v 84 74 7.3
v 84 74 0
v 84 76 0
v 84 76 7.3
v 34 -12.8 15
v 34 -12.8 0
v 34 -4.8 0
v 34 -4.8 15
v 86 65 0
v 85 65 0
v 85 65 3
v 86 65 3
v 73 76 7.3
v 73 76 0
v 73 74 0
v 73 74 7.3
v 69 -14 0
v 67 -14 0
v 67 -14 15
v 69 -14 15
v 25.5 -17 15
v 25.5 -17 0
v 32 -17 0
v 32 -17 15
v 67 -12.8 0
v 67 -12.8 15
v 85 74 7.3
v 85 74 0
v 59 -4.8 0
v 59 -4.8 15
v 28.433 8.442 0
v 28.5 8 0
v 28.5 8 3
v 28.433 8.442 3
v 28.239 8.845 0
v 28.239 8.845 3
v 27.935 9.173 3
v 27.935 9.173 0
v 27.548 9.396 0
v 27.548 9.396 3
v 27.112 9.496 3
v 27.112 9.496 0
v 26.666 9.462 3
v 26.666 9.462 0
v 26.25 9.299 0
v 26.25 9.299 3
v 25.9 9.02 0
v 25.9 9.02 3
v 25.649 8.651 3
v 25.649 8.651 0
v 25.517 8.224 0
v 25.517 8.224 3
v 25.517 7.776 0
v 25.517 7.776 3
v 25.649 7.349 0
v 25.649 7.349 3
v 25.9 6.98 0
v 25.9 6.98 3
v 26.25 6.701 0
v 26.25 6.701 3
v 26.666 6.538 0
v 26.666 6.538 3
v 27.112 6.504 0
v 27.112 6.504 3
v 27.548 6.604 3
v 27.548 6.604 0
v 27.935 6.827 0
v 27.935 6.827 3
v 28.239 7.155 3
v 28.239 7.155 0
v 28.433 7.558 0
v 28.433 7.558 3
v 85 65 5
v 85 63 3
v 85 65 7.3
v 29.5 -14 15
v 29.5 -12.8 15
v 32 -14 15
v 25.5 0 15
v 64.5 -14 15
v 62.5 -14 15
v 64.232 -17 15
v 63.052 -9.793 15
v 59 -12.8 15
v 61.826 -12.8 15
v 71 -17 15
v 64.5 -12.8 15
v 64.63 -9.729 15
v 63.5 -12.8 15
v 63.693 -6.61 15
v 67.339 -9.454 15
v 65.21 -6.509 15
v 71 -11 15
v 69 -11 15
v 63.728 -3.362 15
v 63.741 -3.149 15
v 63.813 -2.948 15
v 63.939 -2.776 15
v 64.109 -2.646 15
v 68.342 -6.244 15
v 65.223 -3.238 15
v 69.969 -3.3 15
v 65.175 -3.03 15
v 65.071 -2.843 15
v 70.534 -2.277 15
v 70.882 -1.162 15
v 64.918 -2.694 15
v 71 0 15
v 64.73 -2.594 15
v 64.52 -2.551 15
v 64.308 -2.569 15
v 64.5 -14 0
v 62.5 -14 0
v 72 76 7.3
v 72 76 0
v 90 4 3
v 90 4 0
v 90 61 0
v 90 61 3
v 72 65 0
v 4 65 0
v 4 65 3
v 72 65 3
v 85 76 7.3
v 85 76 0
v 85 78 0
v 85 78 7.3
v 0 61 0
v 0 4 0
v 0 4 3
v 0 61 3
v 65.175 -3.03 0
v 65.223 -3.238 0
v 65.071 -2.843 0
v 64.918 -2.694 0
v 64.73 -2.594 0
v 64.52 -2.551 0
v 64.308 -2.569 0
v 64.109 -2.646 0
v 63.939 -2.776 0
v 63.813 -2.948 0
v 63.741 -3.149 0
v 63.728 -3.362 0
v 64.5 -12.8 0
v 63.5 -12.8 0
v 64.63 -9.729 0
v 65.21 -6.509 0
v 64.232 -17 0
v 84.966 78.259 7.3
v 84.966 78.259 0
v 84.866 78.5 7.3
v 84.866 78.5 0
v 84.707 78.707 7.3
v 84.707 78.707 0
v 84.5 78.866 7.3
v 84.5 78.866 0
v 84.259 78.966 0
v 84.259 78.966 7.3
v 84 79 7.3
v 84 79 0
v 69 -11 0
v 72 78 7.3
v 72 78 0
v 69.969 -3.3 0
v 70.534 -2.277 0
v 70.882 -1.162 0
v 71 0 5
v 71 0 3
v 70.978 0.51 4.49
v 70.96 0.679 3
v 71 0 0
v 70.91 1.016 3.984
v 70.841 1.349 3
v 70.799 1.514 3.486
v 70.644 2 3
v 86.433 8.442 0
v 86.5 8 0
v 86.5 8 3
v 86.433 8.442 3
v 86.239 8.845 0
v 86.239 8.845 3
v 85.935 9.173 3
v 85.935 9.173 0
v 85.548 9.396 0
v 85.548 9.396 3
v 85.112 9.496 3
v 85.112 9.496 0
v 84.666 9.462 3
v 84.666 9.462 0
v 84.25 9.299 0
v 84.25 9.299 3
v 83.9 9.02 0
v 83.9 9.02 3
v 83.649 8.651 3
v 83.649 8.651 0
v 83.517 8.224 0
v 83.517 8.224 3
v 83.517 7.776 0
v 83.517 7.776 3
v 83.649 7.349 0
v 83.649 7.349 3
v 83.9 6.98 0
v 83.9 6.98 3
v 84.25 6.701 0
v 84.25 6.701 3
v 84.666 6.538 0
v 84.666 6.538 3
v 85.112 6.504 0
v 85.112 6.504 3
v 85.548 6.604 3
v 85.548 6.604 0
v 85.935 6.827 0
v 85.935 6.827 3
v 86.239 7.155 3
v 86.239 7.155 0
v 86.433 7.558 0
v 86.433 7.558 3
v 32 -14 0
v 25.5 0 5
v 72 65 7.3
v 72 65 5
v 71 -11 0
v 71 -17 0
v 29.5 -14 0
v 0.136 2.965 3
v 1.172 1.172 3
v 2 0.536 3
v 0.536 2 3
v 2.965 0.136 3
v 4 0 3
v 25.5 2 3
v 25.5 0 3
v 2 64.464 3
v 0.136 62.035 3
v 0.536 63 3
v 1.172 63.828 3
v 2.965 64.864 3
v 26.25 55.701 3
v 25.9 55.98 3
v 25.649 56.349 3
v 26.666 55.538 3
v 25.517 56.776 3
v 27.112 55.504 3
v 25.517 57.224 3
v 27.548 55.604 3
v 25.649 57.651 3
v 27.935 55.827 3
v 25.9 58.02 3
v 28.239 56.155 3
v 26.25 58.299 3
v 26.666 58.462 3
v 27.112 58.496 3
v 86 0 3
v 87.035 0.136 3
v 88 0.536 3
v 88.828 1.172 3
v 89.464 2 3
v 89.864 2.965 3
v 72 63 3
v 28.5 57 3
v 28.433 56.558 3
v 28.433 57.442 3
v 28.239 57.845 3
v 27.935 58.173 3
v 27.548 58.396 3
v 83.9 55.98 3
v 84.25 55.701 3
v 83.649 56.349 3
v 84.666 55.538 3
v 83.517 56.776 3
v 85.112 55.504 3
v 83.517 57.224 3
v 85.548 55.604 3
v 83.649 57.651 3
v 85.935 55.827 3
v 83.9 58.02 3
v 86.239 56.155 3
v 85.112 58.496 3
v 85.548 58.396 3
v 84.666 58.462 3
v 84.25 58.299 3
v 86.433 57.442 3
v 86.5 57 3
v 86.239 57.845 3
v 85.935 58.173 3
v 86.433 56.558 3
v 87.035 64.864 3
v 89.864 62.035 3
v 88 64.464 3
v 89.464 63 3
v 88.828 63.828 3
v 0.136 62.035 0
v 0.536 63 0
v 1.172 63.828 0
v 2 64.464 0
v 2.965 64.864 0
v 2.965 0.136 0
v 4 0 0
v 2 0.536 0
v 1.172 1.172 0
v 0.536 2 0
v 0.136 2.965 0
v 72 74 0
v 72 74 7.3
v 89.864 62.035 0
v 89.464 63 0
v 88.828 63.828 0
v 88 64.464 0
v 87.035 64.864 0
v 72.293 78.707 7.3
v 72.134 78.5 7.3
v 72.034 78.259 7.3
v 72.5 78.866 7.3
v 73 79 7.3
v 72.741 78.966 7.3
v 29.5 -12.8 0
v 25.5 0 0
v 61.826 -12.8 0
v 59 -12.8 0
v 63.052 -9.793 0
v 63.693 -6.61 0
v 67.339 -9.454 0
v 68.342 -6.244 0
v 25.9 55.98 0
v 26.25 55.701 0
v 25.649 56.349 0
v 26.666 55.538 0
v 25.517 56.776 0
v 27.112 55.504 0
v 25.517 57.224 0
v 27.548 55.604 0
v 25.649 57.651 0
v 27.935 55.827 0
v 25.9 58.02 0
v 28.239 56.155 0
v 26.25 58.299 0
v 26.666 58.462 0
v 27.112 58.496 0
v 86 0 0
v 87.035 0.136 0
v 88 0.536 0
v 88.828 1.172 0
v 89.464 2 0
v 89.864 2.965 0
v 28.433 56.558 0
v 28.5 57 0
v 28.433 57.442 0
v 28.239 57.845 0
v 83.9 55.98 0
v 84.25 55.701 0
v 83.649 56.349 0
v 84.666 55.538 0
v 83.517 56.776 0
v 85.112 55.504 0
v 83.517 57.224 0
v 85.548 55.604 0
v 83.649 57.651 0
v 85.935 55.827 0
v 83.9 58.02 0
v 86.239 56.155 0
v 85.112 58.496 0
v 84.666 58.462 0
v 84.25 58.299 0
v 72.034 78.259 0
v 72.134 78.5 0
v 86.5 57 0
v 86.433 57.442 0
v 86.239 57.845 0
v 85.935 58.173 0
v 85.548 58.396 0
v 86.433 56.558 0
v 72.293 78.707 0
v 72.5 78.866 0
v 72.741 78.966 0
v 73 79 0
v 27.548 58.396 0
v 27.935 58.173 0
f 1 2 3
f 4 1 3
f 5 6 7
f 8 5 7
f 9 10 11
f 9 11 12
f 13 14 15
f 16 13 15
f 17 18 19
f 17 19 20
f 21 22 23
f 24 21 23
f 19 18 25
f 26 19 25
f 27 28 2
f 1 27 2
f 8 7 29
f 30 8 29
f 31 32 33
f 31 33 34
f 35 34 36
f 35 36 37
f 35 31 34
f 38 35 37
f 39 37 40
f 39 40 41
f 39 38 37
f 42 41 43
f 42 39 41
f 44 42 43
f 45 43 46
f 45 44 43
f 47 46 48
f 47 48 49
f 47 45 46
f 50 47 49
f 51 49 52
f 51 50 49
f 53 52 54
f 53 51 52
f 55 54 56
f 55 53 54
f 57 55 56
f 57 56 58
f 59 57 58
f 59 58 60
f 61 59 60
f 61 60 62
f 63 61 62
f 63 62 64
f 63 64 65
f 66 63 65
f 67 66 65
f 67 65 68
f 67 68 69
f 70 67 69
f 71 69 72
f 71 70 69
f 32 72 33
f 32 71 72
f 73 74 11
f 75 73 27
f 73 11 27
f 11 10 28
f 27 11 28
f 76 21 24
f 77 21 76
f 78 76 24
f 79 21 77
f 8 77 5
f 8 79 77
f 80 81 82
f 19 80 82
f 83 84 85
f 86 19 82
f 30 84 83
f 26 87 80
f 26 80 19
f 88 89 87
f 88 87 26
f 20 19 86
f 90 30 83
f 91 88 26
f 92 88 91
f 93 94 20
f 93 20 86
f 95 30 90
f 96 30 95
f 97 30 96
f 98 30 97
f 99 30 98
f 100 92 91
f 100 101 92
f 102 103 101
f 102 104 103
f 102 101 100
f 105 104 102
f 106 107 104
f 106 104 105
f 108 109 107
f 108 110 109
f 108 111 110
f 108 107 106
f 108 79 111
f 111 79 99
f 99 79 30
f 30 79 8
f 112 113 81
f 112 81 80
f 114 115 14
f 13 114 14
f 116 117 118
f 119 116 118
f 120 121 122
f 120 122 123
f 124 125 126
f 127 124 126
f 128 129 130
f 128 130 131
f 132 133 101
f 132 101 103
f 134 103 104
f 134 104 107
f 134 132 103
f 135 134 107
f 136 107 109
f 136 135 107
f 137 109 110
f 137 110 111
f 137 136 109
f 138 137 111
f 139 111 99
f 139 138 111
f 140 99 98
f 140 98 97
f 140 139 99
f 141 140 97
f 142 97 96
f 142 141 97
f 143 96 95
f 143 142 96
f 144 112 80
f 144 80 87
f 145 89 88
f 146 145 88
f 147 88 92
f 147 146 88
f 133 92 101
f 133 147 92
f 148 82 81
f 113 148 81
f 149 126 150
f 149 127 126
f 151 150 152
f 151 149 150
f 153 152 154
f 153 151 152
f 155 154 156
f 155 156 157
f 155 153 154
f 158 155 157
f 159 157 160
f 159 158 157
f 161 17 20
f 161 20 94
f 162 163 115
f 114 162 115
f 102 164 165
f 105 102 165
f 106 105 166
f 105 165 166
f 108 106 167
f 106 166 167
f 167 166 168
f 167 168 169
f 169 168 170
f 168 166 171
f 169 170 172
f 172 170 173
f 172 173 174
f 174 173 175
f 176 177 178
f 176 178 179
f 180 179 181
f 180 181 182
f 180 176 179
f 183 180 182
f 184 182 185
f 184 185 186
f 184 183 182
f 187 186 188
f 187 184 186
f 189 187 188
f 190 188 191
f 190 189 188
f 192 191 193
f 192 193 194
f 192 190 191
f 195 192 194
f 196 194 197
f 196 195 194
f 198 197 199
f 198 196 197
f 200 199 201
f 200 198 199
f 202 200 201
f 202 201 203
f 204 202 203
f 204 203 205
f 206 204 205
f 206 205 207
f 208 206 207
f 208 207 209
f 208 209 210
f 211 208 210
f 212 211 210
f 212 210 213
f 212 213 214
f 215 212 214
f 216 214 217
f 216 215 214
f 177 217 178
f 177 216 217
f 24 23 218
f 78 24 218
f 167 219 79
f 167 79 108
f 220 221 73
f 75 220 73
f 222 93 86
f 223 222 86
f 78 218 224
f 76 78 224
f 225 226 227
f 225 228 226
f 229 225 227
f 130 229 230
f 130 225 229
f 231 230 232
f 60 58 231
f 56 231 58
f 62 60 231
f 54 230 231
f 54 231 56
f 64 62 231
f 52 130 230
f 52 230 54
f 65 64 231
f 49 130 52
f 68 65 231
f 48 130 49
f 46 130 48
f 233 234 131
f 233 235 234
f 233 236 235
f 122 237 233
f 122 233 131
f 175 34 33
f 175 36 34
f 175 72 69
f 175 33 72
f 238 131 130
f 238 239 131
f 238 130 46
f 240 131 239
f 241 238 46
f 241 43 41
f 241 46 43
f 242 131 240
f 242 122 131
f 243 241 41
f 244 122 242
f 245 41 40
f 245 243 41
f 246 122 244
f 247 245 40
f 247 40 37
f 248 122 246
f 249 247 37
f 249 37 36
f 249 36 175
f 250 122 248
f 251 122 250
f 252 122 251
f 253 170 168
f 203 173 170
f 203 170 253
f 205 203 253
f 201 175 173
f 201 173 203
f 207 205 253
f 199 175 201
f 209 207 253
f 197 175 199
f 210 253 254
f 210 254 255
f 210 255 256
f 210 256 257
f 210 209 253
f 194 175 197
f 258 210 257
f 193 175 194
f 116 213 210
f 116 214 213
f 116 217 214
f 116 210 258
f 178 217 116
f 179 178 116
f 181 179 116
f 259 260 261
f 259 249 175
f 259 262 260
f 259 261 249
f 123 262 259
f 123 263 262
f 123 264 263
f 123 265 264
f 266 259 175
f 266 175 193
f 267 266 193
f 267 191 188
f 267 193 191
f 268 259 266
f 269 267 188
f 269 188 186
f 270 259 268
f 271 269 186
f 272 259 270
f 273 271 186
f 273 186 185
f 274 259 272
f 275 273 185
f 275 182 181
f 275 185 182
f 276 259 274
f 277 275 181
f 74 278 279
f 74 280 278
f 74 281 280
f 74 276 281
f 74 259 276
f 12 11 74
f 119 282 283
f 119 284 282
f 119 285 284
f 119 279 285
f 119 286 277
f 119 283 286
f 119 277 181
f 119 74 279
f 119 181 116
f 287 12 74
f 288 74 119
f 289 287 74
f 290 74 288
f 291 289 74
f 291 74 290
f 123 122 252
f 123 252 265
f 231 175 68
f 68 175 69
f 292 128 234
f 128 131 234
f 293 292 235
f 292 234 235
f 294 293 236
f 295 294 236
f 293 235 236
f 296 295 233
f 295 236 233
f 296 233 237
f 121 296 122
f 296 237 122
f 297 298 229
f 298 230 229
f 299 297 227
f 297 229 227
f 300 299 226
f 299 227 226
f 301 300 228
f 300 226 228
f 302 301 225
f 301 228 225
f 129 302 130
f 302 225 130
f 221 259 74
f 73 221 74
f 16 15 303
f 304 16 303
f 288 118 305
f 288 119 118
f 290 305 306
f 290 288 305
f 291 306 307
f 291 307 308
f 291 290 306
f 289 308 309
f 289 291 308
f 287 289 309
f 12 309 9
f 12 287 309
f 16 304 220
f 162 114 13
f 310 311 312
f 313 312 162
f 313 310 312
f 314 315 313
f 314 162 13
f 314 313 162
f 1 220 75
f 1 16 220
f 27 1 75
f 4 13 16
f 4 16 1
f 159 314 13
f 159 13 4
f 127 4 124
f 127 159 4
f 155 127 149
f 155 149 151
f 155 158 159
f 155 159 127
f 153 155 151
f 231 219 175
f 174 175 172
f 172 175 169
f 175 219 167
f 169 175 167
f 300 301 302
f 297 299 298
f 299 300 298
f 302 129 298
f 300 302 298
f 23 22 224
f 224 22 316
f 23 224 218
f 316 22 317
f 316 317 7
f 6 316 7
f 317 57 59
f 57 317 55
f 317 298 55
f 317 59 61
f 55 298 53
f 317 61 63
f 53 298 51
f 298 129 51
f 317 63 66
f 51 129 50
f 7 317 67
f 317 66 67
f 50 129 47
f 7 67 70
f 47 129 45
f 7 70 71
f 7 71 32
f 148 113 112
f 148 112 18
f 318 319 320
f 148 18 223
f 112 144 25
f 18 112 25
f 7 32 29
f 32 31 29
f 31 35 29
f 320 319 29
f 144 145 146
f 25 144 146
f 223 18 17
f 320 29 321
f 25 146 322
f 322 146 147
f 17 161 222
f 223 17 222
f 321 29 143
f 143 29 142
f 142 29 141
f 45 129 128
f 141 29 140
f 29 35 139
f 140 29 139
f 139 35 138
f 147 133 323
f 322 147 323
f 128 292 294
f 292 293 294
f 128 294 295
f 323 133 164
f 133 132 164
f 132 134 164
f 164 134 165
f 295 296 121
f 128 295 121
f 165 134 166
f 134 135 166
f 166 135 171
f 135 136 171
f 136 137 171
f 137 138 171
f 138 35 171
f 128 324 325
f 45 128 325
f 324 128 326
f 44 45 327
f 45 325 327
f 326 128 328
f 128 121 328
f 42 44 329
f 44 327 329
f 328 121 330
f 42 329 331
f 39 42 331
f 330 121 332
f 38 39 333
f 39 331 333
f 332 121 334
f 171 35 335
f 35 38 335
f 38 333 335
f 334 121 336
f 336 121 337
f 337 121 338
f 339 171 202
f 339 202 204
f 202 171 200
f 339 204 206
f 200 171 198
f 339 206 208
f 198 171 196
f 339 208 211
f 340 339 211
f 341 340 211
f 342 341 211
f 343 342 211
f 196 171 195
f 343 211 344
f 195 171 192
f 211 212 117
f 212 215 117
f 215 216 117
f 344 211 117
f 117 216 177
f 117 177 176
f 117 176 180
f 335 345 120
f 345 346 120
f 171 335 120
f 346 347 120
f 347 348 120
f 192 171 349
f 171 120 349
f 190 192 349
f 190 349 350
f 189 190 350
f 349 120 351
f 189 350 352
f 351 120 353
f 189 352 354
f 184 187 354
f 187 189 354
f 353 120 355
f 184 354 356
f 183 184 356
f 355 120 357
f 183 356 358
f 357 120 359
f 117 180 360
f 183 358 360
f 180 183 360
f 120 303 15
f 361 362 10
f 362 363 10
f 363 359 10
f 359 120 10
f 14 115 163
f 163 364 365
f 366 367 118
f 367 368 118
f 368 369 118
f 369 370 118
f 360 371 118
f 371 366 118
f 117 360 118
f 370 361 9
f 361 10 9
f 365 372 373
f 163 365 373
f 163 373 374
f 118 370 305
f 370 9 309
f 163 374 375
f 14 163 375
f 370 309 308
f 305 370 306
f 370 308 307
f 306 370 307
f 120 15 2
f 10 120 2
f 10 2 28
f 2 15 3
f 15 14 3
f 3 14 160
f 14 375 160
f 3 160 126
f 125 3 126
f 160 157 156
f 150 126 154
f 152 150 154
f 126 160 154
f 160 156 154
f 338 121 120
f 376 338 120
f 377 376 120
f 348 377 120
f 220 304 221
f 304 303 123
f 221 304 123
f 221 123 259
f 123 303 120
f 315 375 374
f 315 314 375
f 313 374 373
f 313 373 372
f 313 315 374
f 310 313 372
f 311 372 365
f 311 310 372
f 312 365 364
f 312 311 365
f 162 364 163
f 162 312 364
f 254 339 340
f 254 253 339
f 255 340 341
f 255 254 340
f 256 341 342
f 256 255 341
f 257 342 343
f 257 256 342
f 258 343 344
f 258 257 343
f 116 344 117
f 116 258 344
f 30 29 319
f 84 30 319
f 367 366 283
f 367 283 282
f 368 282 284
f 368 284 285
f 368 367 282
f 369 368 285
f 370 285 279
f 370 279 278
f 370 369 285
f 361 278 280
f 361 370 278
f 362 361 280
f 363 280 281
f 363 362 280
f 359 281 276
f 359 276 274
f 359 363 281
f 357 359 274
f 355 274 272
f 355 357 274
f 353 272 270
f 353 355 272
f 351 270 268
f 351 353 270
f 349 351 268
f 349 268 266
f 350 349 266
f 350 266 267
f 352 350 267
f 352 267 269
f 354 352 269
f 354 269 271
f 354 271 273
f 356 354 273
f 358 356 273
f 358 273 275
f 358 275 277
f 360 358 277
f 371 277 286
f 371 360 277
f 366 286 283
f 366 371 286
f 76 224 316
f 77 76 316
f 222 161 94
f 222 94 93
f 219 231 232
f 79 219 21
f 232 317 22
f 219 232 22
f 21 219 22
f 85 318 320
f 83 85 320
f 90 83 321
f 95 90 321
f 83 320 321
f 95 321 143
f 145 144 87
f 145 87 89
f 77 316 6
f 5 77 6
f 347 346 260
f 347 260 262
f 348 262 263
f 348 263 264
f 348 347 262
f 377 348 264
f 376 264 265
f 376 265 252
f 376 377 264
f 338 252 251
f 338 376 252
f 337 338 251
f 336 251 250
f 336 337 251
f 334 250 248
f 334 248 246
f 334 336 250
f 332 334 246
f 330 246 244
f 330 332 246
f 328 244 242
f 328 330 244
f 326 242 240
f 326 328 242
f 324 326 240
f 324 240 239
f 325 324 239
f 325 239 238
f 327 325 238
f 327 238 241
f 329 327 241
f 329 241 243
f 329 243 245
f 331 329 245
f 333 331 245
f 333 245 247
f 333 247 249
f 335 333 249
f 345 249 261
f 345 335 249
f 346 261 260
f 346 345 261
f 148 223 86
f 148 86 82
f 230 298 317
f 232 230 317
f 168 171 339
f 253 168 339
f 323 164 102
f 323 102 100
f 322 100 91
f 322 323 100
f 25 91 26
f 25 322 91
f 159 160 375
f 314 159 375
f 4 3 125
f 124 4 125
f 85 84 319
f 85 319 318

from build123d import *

# Parameters (mm, degrees)
SKETCH_W     = 90
SKETCH_H     = 65
SKETCH_R     = 1.5
PAD_DEPTH    = 3
PAD001_DEPTH = 7.3
PAD002_DEPTH = 15
FILLET_R     = 4
FILLET002_R  = 1
CHAMFER_SIZE = 2


with BuildPart() as part:
    # Sketch → Pad (new body)
    with BuildSketch(Plane.XY):
        with Locations((45, 32.5)):
            Rectangle(SKETCH_W, SKETCH_H)
        with Locations((27, 57)):
            Circle(SKETCH_R, mode=Mode.SUBTRACT)
        with Locations((85, 57)):
            Circle(SKETCH_R, mode=Mode.SUBTRACT)
        with Locations((85, 8)):
            Circle(SKETCH_R, mode=Mode.SUBTRACT)
        with Locations((27, 8)):
            Circle(SKETCH_R, mode=Mode.SUBTRACT)
    extrude(amount=PAD_DEPTH)

    # Sketch002 → Pad001 (join)
    with BuildSketch(Plane.XY):
        Polygon((85, 65), (85, 74), (84, 74), (84, 76), (85, 76), (85, 79), (72, 79), (72, 76), (73, 76), (73, 74), (72, 74), (72, 65), align=None)
    extrude(amount=PAD001_DEPTH)

    # Sketch003 → Pad002 (join)
    with BuildSketch(Plane.XY):
        with BuildLine():
            Line((25.5, 0), (25.5, -17))
            Line((25.5, -17), (32, -17))
            Line((32, -17), (32, -14))
            Line((32, -14), (29.5, -14))
            Line((29.5, -14), (29.5, -12.8))
            Line((29.5, -12.8), (34, -12.8))
            Line((34, -12.8), (34, -4.8))
            Line((34, -4.8), (59, -4.8))
            Line((59, -4.8), (59, -12.8))
            Line((59, -12.8), (61.825962, -12.8))
            ThreePointArc((61.825962, -12.8), (63.447393, -8.216284), (63.728416, -3.362367))
            ThreePointArc((65.223221, -3.237633), (64.413451, -2.552598), (63.728416, -3.362367))
            ThreePointArc((63.5, -12.8), (64.990453, -8.132139), (65.223221, -3.237633))
            Line((64.5, -12.8), (63.5, -12.8))
            Line((64.5, -14), (64.5, -12.8))
            Line((62.5, -14), (64.5, -14))
            Line((64.232051, -17), (62.5, -14))
            Line((71, -17), (64.232051, -17))
            Line((71, -11), (71, -17))
            Line((69, -11), (71, -11))
            Line((69, -14), (69, -11))
            Line((67, -14), (69, -14))
            Line((67, -14), (67, -12.8))
            ThreePointArc((69.968746, -3.3), (67.759472, -7.823469), (67, -12.8))
            ThreePointArc((69.968746, -3.3), (70.736182, -1.728691), (71, 0))
            Line((25.5, 0), (71, 0))
        make_face()
    extrude(amount=PAD002_DEPTH)

    # Fillet
    fillet_edges = [part.edges().sort_by_distance(p)[0] for p in [
        (90, 0, 1.5),
        (90, 65, 1.5),
        (0, 65, 1.5),
        (0, 0, 1.5),
    ]]
    fillet(fillet_edges, radius=FILLET_R)

    # Fillet002
    fillet002_edges = [part.edges().sort_by_distance(p)[0] for p in [
        (85, 79, 3.65),
        (72, 79, 3.65),
    ]]
    fillet(fillet002_edges, radius=FILLET002_R)

    # Chamfer
    chamfer_edges = [part.edges().sort_by_distance(p)[0] for p in [
        (78.5, 65, 3),
        (48.25, 0, 3),
    ]]
    chamfer(chamfer_edges, length=CHAMFER_SIZE)


solid = part.part
